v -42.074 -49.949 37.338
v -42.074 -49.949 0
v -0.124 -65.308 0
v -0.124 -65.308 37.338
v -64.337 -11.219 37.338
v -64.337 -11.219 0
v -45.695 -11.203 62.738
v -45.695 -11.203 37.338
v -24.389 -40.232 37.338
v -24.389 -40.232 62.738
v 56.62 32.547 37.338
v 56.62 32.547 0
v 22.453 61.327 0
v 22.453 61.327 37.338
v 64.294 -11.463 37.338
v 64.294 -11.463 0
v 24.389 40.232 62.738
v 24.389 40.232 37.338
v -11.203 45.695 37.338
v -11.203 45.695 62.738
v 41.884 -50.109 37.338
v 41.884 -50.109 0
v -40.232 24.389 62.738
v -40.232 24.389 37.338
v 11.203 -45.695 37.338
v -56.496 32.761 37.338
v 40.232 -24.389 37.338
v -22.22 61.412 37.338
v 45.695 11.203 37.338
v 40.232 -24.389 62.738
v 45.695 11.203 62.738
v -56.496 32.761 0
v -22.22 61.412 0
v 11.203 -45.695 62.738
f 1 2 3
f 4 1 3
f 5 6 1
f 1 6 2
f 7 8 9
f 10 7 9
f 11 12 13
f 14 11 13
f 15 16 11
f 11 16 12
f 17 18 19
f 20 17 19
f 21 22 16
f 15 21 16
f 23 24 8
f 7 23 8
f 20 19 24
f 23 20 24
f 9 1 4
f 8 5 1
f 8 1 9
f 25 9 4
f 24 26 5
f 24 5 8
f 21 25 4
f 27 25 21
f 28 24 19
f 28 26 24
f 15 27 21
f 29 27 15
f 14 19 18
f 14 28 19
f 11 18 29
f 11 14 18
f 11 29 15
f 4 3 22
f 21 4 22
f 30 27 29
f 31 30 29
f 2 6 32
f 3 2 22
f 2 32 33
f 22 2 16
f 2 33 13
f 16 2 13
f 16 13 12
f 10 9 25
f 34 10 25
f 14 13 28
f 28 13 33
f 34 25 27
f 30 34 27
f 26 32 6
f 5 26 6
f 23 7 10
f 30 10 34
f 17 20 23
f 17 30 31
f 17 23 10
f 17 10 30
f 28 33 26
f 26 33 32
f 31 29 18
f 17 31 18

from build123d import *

# Parameters (mm, degrees)
F1_DEPTH = 37.338
F3_DEPTH = 25.4


with BuildPart() as f1:
    # F0 (on Top) → F1 (new body)
    with BuildSketch(Plane.XY):
        Polygon((41.884293, -50.10855), (64.294385, -11.462672), (56.62042, 32.546718), (22.453131, 61.327137), (-22.220228, 61.411907), (-56.496495, 32.761363), (-64.337424, -11.218587), (-42.074157, -49.949235), (-0.123925, -65.308081), align=None)
    extrude(amount=F1_DEPTH)

    # F2 (on face) → F3 (join)
    with BuildSketch(Plane.XY.offset(37.338)):
        Polygon((-11.20264, 45.694511), (-40.232361, 24.389435), (-45.694511, -11.20264), (-24.389435, -40.232361), (11.20264, -45.694511), (40.232361, -24.389435), (45.694511, 11.20264), (24.389435, 40.232361), align=None)
    extrude(amount=F3_DEPTH)


solid = f1.part
